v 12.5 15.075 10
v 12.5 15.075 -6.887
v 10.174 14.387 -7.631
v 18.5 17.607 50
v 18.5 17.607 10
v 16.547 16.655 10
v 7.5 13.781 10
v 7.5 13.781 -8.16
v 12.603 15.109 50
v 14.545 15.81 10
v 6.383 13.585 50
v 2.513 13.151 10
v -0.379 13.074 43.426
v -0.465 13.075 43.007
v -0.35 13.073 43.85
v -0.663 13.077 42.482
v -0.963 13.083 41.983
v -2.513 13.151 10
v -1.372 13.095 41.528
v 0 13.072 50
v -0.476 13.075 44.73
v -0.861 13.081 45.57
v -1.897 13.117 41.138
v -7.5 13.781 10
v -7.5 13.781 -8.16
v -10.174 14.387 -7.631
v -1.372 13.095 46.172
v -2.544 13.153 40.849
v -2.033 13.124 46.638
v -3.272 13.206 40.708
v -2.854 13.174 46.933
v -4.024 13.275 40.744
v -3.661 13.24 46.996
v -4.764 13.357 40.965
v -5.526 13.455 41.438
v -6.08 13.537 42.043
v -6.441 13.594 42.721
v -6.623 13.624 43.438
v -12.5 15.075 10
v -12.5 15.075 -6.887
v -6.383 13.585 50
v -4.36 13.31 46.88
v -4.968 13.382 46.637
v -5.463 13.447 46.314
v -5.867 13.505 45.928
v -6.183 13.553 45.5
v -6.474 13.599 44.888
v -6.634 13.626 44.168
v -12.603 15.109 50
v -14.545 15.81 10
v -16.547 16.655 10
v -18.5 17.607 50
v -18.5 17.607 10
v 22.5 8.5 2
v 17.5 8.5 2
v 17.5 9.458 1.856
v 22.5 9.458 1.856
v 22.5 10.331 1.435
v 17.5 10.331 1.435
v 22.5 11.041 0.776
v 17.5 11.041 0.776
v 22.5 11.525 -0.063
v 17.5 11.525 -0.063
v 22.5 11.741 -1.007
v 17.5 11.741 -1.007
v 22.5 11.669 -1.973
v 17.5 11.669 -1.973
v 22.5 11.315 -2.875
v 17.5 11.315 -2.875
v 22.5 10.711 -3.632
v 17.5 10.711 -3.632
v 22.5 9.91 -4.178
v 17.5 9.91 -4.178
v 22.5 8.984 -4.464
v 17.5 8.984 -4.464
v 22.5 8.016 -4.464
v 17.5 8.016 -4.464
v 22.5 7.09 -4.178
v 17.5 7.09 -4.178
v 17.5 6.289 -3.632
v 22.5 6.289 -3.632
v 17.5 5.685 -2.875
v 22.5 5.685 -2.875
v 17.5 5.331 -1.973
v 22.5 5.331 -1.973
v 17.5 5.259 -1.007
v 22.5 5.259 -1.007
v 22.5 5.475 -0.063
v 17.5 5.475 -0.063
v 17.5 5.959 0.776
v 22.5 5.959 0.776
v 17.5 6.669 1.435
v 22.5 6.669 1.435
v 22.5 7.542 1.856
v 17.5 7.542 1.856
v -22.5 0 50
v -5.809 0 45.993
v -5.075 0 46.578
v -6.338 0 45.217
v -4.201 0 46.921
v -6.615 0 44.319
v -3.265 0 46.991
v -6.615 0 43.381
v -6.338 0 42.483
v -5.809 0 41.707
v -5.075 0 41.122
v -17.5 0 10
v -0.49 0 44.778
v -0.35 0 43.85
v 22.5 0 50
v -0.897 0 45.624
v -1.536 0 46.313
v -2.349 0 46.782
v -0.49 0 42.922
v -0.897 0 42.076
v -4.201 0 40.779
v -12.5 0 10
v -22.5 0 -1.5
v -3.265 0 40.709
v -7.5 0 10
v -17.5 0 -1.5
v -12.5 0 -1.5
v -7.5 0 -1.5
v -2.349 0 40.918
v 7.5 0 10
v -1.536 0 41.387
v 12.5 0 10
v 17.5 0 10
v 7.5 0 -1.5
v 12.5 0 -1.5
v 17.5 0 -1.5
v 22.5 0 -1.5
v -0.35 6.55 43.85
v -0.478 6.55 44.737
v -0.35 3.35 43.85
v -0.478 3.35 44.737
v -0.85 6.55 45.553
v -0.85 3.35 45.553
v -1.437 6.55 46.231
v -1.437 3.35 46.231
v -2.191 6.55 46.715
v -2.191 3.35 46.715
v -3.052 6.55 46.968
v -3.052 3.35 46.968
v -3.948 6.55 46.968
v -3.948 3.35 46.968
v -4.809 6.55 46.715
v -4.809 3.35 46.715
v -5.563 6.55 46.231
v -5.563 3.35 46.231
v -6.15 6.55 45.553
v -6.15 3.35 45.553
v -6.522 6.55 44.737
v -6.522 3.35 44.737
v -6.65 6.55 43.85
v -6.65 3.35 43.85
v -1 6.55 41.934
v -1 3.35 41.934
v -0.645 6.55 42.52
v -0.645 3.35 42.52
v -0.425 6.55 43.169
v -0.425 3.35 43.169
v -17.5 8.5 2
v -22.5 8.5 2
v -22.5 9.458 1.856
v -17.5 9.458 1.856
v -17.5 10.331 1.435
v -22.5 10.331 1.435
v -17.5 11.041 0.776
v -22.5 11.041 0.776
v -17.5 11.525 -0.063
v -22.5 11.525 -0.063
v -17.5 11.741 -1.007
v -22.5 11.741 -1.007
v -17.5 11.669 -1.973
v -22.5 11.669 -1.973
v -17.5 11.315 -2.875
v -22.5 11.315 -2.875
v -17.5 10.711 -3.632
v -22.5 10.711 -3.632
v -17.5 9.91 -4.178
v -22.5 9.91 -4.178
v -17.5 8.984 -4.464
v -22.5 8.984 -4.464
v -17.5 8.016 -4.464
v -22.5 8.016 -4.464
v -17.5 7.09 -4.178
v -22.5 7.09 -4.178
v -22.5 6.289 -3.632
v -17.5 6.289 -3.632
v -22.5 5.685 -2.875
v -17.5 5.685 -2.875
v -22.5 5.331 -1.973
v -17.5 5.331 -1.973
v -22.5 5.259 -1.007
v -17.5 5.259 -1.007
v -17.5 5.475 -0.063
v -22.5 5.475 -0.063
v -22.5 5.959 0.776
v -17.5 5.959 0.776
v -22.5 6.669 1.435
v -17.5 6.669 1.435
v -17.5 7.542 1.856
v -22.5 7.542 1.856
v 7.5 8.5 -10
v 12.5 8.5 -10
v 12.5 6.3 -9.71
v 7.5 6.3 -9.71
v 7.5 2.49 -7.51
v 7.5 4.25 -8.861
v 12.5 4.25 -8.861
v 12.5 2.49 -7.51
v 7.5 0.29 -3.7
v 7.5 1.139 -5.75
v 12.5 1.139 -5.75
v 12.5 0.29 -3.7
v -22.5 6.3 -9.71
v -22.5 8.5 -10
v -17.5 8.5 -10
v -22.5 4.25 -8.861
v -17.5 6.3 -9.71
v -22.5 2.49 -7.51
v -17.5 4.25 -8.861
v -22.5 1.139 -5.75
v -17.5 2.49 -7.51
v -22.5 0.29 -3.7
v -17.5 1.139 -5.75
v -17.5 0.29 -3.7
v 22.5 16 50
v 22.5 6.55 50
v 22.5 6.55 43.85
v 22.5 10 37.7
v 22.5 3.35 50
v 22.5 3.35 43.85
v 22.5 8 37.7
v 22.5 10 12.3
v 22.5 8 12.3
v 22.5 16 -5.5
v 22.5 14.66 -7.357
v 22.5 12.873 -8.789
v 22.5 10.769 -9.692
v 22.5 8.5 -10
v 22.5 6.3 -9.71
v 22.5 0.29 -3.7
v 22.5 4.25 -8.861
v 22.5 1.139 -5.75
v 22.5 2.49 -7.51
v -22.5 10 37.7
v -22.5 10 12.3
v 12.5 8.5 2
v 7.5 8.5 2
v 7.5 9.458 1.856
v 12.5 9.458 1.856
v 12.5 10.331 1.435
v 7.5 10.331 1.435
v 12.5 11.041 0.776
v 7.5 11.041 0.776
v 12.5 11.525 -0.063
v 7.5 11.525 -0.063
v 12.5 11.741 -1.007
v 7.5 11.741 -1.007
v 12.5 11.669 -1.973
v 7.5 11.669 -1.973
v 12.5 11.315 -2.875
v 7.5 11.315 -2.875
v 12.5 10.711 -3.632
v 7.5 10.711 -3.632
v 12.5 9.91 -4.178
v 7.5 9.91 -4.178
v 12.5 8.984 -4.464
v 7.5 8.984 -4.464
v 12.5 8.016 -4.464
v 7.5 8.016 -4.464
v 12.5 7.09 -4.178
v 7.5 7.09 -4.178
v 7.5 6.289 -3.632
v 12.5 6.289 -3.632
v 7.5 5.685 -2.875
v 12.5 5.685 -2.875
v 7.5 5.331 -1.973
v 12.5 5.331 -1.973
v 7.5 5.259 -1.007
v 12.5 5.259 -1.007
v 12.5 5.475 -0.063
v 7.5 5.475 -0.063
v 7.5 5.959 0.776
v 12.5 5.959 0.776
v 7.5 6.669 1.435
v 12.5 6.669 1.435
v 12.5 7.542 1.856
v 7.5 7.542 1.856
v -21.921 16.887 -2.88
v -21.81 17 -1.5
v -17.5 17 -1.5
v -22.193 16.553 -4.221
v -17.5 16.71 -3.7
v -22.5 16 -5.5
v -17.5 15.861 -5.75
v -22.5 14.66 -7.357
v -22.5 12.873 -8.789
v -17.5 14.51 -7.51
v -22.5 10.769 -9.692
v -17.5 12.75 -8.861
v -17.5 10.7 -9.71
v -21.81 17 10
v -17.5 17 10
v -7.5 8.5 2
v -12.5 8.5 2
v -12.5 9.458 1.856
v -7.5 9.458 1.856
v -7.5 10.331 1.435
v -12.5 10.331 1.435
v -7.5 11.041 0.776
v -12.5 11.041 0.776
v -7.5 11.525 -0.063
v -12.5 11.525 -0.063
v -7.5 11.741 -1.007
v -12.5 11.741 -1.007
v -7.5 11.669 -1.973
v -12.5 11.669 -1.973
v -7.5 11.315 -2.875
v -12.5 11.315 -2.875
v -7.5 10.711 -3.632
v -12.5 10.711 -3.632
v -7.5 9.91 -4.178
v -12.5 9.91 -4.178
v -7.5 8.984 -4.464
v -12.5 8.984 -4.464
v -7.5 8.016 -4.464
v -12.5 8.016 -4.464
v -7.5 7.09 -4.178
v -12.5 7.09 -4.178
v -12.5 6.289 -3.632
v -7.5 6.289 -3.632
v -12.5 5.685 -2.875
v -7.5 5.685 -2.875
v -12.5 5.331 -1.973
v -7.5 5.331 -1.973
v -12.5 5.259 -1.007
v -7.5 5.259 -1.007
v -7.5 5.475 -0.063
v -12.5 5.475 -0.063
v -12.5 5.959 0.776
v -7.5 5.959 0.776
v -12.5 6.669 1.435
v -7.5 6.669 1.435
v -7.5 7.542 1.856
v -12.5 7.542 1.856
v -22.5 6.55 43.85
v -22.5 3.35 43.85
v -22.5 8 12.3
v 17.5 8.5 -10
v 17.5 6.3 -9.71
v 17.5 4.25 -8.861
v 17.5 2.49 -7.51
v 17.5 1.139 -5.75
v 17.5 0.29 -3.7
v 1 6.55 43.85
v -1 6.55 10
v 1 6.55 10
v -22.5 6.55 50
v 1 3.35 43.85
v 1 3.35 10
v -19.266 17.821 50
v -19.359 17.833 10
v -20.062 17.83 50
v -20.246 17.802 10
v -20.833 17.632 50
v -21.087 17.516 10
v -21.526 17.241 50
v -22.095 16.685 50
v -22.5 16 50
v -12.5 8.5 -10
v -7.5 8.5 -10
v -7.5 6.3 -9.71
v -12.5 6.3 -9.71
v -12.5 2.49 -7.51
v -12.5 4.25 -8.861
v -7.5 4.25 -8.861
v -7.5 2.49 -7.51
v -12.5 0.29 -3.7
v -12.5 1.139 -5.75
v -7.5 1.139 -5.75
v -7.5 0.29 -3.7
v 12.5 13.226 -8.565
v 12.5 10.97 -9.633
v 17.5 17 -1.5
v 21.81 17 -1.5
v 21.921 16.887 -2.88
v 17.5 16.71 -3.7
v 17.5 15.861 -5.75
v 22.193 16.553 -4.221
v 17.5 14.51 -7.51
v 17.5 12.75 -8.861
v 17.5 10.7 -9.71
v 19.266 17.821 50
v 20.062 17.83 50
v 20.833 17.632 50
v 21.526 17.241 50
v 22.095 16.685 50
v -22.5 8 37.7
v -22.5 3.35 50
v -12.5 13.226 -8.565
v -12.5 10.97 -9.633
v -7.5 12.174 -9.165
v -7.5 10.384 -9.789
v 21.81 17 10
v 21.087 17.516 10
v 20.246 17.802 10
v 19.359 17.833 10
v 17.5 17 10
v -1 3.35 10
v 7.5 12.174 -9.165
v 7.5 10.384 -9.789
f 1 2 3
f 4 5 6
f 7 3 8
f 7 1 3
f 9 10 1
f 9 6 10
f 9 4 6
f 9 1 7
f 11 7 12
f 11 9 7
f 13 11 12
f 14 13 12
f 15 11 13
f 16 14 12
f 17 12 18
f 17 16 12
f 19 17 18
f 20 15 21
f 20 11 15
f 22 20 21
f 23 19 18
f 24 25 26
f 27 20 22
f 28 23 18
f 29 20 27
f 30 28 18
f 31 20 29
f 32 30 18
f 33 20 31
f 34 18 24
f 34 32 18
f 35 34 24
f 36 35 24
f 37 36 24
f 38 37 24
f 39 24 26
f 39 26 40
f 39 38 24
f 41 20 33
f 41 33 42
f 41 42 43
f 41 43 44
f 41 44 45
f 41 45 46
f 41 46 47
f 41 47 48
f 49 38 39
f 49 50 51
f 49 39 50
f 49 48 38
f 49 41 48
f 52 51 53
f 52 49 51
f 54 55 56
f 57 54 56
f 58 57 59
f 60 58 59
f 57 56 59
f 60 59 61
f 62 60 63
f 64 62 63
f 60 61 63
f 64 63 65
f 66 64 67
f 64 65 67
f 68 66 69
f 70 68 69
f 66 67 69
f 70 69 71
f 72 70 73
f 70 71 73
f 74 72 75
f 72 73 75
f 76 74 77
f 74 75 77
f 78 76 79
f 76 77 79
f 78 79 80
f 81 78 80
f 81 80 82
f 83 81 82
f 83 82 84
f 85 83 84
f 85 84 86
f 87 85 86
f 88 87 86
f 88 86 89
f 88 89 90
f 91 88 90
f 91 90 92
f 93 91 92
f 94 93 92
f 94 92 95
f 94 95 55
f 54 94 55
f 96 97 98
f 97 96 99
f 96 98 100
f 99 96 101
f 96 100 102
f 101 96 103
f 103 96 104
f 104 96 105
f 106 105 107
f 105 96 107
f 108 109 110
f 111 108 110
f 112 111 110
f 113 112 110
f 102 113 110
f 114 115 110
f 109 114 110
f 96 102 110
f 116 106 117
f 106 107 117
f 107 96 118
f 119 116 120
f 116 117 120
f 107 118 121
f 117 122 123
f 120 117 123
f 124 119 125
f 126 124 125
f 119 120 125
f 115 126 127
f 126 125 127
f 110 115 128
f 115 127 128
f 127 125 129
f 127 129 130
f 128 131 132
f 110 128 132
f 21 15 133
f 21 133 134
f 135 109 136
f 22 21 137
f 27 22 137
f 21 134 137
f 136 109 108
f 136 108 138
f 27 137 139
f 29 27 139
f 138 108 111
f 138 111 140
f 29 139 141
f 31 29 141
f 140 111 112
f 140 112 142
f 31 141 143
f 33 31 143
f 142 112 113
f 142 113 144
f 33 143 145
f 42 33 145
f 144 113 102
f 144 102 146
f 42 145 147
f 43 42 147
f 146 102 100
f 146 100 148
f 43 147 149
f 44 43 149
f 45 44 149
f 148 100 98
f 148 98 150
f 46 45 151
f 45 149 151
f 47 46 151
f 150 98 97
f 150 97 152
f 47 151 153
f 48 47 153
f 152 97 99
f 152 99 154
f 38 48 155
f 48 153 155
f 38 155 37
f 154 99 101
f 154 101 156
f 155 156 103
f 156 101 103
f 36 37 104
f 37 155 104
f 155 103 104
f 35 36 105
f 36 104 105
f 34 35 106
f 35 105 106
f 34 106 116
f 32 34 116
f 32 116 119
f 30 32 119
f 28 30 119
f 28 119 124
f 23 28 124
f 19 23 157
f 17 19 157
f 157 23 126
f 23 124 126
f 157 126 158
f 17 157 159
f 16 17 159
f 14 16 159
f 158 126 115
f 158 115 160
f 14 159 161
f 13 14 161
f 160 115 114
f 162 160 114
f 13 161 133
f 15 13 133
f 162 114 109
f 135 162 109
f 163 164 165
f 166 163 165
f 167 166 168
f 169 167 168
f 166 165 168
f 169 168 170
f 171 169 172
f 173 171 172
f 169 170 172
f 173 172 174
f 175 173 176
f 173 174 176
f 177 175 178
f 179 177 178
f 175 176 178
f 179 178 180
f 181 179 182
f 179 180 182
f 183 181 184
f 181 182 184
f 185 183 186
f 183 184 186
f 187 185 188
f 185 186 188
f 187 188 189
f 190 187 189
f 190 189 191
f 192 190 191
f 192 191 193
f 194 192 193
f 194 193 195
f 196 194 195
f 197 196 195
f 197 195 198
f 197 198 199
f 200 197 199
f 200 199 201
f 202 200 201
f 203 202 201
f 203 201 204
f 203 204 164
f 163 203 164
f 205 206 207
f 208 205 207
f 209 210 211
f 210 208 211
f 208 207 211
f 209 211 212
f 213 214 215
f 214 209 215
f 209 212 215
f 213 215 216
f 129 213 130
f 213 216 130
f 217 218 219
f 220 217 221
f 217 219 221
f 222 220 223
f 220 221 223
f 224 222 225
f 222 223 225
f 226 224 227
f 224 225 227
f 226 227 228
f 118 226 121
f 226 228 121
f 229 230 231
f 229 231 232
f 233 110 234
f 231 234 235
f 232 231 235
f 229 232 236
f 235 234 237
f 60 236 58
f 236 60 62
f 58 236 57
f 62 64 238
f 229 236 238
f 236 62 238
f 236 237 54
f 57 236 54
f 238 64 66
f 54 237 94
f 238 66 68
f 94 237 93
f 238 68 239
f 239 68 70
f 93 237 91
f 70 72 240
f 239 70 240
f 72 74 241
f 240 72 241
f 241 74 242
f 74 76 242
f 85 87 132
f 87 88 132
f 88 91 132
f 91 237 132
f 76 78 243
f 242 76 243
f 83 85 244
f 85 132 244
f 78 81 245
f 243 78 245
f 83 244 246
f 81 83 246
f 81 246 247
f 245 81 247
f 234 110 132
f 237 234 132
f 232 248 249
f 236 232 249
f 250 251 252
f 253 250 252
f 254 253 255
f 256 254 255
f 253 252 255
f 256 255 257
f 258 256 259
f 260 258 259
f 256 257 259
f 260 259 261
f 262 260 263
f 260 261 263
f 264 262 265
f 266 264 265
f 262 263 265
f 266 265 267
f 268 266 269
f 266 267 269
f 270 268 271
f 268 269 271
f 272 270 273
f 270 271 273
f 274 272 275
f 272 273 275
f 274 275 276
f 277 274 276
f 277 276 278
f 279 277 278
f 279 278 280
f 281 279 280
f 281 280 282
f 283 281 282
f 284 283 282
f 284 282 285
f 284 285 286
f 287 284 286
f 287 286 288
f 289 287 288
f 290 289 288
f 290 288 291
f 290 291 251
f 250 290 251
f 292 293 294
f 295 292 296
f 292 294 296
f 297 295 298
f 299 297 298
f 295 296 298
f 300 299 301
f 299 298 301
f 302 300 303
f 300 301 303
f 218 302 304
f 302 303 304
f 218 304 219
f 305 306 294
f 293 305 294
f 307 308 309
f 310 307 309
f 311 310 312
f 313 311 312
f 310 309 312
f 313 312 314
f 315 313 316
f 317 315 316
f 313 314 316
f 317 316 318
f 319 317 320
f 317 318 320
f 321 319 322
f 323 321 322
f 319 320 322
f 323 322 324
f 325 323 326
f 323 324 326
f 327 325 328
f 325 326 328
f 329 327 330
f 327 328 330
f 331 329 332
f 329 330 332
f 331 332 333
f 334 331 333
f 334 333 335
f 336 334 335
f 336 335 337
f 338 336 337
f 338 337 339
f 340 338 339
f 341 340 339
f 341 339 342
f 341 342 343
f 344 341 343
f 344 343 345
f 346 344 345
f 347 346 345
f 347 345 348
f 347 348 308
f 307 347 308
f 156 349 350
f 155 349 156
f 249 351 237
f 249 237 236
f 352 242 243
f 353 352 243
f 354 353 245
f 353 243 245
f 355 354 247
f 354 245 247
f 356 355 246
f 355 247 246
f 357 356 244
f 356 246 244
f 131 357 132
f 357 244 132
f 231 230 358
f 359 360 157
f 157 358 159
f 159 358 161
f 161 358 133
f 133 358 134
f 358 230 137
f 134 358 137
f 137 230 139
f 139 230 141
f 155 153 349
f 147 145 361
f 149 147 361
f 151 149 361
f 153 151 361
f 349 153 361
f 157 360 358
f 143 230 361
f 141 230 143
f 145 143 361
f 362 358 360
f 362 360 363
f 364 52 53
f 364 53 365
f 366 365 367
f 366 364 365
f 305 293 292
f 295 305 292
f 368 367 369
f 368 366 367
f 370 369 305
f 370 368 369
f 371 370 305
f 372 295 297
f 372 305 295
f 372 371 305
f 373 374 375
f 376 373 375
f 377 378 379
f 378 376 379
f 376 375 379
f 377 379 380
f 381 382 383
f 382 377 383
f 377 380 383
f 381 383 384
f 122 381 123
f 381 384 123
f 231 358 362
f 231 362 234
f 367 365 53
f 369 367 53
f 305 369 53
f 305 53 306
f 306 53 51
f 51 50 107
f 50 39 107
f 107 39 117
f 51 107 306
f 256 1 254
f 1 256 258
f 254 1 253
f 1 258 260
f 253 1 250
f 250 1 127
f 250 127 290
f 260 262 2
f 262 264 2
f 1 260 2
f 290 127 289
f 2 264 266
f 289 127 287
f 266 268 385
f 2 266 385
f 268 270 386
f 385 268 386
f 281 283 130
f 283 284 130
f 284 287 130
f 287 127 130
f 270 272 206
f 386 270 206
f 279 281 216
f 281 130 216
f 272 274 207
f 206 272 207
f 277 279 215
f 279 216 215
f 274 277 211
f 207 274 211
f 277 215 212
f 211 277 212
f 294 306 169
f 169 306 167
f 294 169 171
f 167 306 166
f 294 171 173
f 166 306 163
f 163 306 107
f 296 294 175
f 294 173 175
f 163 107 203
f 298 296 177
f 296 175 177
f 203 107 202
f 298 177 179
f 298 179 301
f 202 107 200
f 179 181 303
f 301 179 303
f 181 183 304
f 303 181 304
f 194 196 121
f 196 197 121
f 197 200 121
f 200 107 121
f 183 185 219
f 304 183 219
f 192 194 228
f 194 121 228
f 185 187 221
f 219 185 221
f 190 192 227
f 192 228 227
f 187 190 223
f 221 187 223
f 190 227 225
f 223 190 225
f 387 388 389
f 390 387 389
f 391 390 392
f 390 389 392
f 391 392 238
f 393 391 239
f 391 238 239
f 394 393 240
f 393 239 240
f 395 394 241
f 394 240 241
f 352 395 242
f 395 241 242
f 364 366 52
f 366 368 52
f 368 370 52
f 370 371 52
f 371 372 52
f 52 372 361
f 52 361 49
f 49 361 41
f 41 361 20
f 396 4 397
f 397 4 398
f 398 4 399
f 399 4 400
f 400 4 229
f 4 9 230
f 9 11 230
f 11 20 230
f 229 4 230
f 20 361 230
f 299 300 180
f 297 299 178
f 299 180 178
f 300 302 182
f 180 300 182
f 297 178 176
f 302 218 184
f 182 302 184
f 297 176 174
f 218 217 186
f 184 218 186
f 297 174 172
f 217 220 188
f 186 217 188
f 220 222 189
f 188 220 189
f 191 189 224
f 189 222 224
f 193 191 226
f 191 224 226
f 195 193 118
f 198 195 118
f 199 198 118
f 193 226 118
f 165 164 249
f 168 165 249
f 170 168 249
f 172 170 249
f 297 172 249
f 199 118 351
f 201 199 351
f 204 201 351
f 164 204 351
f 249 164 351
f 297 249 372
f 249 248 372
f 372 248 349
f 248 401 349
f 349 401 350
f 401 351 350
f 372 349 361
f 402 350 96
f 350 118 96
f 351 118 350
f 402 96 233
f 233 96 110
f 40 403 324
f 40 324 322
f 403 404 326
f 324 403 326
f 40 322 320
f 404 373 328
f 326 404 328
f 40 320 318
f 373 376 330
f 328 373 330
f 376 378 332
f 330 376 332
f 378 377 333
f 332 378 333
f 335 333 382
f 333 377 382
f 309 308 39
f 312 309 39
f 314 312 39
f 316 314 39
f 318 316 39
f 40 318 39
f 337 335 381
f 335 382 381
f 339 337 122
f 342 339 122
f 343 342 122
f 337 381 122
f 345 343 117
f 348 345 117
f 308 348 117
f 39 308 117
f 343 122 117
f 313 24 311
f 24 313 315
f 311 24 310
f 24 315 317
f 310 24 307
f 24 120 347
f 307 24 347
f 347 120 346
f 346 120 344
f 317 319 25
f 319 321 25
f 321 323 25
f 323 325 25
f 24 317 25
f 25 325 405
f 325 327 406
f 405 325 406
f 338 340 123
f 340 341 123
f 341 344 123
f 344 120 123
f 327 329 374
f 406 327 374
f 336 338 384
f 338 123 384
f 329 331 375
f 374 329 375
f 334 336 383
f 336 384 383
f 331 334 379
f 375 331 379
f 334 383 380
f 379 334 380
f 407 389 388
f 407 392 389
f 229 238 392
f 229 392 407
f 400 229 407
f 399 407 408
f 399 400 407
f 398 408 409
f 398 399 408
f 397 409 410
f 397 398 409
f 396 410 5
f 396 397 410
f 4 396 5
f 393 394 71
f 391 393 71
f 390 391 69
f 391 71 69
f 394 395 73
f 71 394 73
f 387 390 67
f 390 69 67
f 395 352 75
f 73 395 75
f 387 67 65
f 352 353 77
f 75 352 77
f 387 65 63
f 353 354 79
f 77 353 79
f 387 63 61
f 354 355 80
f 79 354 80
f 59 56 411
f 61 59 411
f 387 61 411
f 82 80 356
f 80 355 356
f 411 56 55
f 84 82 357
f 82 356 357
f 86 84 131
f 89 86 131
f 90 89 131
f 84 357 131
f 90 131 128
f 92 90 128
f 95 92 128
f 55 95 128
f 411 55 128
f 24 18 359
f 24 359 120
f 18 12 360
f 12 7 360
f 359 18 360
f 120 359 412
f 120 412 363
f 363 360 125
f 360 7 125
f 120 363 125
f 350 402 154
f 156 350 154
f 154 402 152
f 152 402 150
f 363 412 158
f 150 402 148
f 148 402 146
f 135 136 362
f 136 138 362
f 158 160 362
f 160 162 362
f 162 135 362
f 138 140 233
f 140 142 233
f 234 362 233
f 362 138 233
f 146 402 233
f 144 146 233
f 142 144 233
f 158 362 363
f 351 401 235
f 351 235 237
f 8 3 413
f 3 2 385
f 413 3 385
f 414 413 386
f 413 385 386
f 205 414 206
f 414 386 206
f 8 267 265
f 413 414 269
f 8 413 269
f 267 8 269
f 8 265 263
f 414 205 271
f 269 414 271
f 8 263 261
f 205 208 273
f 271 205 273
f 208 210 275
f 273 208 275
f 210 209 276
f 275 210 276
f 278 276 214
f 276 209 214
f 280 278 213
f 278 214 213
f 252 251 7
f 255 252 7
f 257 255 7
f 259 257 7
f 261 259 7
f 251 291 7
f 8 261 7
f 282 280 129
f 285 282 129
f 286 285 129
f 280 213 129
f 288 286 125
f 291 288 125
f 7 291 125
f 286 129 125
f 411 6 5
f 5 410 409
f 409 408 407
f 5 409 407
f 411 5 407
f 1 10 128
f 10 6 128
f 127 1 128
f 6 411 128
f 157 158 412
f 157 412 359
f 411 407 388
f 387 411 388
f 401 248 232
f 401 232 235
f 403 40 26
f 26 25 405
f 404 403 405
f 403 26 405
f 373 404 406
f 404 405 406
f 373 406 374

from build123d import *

# Parameters (mm, degrees)
BOSS_EXTRUDE1_DEPTH = 20
CUT_EXTRUDE19_DEPTH = 45
CUT_EXTRUDE23_DEPTH = 444
SKETCH10_W          = 25.4
SKETCH10_H          = 2
CUT_EXTRUDE25_DEPTH = 45
CUT_EXTRUDE26_DEPTH = 444
SKETCH16_R          = 3.25
SKETCH16_R_2        = 3.15
CUT_EXTRUDE28_DEPTH = 45
SKETCH18_R          = 3.15
CUT_EXTRUDE30_DEPTH = 20
CUT_EXTRUDE31_DEPTH = 6.15


with BuildPart() as part:
    # Sketch1 → Boss-Extrude1 (new body)
    with BuildSketch(Plane(origin=(0, 0, 0), x_dir=(1, 0, 0), z_dir=(0, 1, 0))):
        Polygon((-22.5, -50), (22.5, -50), (22.5, 10), (17.5, 10), (17.5, -10), (12.5, -10), (12.5, 10), (7.5, 10), (7.5, -10), (2.5, -10), (-2.5, -10), (-7.5, -10), (-7.5, 10), (-12.5, 10), (-12.5, -10), (-17.5, -10), (-17.5, 10), (-22.5, 10), align=None)
    extrude(amount=BOSS_EXTRUDE1_DEPTH)

    # Sketch6 → Cut-Extrude19 (cut)
    with BuildSketch(Plane(origin=(22.5, 0, 0), x_dir=(0, 0, -1), z_dir=(1, 0, 0))):
        with BuildLine():
            ThreePointArc((10, 8.5), (7.51040764, 2.48959236), (1.5, 0))
            Line((1.5, 0), (10, 0))
            Line((10, 0), (10, 8.5))
        make_face()
        with BuildLine():
            ThreePointArc((1.5, 17), (7.51040764, 14.51040764), (10, 8.5))
            Line((10, 8.5), (10, 20))
            Line((10, 20), (-10, 20))
            Line((-10, 20), (-10, 17))
            Line((-10, 17), (1.5, 17))
        make_face()
    extrude(amount=-CUT_EXTRUDE19_DEPTH, mode=Mode.SUBTRACT)

    # Sketch2 → Cut-Extrude23 (cut)
    with BuildSketch(Plane.XY.offset(50)):
        with BuildLine():
            Line((-22.5, 20), (22.5, 20))
            Line((22.5, 20), (22.5, 16))
            ThreePointArc((22.5, 16), (20.832845478, 17.631987193), (18.5, 17.607120136))
            ThreePointArc((18.5, 17.607120136), (0, 13.071891388), (-18.5, 17.607120136))
            ThreePointArc((-18.5, 17.607120136), (-20.832845478, 17.631987193), (-22.5, 16))
            Line((-22.5, 16), (-22.5, 20))
        make_face()
    extrude(amount=-CUT_EXTRUDE23_DEPTH, mode=Mode.SUBTRACT)

    # Sketch10 → Cut-Extrude25 (cut)
    with BuildSketch(Plane.ZY.offset(22.5)):
        Polygon((37.7, 10), (37.7, 8), (12.3, 8), (12.3, 10), (25, 10), align=None)
        with Locations((-25, 9)):
            Rectangle(SKETCH10_W, SKETCH10_H)
        Polygon((-303.835718962, 8), (-292.208543952, 8), (-279.508543952, 8), (-279.508543952, 10), (-292.208543952, 10), (-303.835718962, 10), align=None)
        Polygon((-329.508543952, 10), (-329.508543952, 8), (-354.908543952, 8), (-354.908543952, 10), (-342.208543952, 10), align=None)
        Polygon((-229.508543952, 8), (-254.908543952, 8), (-254.908543952, 10), (-242.208543952, 10), (-229.508543952, 10), align=None)
    extrude(amount=-CUT_EXTRUDE25_DEPTH, mode=Mode.SUBTRACT)

    # Sketch12 → Cut-Extrude26 (cut)
    with BuildSketch(Plane.XY.offset(50)):
        Polygon((-1, 3.35), (-1, 6.55), (0, 6.55), (1, 6.55), (1, 3.35), align=None)
    extrude(amount=-CUT_EXTRUDE26_DEPTH, mode=Mode.SUBTRACT)

    # Sketch16 → Cut-Extrude28 (cut)
    with BuildSketch(Plane.ZY.offset(22.5)):
        with Locations((-1.25, 8.5)):
            Circle(SKETCH16_R)
        with Locations((-386.058543952, 2.588831384)):
            Circle(SKETCH16_R_2)
    extrude(amount=-CUT_EXTRUDE28_DEPTH, mode=Mode.SUBTRACT)

    # Sketch18 → Cut-Extrude30 (cut)
    with BuildSketch(Plane.XZ):
        with Locations((-3.5, 43.85)):
            Circle(SKETCH18_R)
    extrude(amount=-CUT_EXTRUDE30_DEPTH, mode=Mode.SUBTRACT)

    # Sketch24 → Cut-Extrude31 (cut)
    with BuildSketch(Plane.XY.offset(50)):
        Polygon((-1, 6.55), (-11, 6.55), (-22.5, 6.55), (-22.5, 3.35), (-11, 3.35), (-1, 3.35), (1, 3.35), (11, 3.35), (22.5, 3.35), (22.5, 6.55), (11, 6.55), (1, 6.55), align=None)
    extrude(amount=-CUT_EXTRUDE31_DEPTH, mode=Mode.SUBTRACT)


solid = part.part
